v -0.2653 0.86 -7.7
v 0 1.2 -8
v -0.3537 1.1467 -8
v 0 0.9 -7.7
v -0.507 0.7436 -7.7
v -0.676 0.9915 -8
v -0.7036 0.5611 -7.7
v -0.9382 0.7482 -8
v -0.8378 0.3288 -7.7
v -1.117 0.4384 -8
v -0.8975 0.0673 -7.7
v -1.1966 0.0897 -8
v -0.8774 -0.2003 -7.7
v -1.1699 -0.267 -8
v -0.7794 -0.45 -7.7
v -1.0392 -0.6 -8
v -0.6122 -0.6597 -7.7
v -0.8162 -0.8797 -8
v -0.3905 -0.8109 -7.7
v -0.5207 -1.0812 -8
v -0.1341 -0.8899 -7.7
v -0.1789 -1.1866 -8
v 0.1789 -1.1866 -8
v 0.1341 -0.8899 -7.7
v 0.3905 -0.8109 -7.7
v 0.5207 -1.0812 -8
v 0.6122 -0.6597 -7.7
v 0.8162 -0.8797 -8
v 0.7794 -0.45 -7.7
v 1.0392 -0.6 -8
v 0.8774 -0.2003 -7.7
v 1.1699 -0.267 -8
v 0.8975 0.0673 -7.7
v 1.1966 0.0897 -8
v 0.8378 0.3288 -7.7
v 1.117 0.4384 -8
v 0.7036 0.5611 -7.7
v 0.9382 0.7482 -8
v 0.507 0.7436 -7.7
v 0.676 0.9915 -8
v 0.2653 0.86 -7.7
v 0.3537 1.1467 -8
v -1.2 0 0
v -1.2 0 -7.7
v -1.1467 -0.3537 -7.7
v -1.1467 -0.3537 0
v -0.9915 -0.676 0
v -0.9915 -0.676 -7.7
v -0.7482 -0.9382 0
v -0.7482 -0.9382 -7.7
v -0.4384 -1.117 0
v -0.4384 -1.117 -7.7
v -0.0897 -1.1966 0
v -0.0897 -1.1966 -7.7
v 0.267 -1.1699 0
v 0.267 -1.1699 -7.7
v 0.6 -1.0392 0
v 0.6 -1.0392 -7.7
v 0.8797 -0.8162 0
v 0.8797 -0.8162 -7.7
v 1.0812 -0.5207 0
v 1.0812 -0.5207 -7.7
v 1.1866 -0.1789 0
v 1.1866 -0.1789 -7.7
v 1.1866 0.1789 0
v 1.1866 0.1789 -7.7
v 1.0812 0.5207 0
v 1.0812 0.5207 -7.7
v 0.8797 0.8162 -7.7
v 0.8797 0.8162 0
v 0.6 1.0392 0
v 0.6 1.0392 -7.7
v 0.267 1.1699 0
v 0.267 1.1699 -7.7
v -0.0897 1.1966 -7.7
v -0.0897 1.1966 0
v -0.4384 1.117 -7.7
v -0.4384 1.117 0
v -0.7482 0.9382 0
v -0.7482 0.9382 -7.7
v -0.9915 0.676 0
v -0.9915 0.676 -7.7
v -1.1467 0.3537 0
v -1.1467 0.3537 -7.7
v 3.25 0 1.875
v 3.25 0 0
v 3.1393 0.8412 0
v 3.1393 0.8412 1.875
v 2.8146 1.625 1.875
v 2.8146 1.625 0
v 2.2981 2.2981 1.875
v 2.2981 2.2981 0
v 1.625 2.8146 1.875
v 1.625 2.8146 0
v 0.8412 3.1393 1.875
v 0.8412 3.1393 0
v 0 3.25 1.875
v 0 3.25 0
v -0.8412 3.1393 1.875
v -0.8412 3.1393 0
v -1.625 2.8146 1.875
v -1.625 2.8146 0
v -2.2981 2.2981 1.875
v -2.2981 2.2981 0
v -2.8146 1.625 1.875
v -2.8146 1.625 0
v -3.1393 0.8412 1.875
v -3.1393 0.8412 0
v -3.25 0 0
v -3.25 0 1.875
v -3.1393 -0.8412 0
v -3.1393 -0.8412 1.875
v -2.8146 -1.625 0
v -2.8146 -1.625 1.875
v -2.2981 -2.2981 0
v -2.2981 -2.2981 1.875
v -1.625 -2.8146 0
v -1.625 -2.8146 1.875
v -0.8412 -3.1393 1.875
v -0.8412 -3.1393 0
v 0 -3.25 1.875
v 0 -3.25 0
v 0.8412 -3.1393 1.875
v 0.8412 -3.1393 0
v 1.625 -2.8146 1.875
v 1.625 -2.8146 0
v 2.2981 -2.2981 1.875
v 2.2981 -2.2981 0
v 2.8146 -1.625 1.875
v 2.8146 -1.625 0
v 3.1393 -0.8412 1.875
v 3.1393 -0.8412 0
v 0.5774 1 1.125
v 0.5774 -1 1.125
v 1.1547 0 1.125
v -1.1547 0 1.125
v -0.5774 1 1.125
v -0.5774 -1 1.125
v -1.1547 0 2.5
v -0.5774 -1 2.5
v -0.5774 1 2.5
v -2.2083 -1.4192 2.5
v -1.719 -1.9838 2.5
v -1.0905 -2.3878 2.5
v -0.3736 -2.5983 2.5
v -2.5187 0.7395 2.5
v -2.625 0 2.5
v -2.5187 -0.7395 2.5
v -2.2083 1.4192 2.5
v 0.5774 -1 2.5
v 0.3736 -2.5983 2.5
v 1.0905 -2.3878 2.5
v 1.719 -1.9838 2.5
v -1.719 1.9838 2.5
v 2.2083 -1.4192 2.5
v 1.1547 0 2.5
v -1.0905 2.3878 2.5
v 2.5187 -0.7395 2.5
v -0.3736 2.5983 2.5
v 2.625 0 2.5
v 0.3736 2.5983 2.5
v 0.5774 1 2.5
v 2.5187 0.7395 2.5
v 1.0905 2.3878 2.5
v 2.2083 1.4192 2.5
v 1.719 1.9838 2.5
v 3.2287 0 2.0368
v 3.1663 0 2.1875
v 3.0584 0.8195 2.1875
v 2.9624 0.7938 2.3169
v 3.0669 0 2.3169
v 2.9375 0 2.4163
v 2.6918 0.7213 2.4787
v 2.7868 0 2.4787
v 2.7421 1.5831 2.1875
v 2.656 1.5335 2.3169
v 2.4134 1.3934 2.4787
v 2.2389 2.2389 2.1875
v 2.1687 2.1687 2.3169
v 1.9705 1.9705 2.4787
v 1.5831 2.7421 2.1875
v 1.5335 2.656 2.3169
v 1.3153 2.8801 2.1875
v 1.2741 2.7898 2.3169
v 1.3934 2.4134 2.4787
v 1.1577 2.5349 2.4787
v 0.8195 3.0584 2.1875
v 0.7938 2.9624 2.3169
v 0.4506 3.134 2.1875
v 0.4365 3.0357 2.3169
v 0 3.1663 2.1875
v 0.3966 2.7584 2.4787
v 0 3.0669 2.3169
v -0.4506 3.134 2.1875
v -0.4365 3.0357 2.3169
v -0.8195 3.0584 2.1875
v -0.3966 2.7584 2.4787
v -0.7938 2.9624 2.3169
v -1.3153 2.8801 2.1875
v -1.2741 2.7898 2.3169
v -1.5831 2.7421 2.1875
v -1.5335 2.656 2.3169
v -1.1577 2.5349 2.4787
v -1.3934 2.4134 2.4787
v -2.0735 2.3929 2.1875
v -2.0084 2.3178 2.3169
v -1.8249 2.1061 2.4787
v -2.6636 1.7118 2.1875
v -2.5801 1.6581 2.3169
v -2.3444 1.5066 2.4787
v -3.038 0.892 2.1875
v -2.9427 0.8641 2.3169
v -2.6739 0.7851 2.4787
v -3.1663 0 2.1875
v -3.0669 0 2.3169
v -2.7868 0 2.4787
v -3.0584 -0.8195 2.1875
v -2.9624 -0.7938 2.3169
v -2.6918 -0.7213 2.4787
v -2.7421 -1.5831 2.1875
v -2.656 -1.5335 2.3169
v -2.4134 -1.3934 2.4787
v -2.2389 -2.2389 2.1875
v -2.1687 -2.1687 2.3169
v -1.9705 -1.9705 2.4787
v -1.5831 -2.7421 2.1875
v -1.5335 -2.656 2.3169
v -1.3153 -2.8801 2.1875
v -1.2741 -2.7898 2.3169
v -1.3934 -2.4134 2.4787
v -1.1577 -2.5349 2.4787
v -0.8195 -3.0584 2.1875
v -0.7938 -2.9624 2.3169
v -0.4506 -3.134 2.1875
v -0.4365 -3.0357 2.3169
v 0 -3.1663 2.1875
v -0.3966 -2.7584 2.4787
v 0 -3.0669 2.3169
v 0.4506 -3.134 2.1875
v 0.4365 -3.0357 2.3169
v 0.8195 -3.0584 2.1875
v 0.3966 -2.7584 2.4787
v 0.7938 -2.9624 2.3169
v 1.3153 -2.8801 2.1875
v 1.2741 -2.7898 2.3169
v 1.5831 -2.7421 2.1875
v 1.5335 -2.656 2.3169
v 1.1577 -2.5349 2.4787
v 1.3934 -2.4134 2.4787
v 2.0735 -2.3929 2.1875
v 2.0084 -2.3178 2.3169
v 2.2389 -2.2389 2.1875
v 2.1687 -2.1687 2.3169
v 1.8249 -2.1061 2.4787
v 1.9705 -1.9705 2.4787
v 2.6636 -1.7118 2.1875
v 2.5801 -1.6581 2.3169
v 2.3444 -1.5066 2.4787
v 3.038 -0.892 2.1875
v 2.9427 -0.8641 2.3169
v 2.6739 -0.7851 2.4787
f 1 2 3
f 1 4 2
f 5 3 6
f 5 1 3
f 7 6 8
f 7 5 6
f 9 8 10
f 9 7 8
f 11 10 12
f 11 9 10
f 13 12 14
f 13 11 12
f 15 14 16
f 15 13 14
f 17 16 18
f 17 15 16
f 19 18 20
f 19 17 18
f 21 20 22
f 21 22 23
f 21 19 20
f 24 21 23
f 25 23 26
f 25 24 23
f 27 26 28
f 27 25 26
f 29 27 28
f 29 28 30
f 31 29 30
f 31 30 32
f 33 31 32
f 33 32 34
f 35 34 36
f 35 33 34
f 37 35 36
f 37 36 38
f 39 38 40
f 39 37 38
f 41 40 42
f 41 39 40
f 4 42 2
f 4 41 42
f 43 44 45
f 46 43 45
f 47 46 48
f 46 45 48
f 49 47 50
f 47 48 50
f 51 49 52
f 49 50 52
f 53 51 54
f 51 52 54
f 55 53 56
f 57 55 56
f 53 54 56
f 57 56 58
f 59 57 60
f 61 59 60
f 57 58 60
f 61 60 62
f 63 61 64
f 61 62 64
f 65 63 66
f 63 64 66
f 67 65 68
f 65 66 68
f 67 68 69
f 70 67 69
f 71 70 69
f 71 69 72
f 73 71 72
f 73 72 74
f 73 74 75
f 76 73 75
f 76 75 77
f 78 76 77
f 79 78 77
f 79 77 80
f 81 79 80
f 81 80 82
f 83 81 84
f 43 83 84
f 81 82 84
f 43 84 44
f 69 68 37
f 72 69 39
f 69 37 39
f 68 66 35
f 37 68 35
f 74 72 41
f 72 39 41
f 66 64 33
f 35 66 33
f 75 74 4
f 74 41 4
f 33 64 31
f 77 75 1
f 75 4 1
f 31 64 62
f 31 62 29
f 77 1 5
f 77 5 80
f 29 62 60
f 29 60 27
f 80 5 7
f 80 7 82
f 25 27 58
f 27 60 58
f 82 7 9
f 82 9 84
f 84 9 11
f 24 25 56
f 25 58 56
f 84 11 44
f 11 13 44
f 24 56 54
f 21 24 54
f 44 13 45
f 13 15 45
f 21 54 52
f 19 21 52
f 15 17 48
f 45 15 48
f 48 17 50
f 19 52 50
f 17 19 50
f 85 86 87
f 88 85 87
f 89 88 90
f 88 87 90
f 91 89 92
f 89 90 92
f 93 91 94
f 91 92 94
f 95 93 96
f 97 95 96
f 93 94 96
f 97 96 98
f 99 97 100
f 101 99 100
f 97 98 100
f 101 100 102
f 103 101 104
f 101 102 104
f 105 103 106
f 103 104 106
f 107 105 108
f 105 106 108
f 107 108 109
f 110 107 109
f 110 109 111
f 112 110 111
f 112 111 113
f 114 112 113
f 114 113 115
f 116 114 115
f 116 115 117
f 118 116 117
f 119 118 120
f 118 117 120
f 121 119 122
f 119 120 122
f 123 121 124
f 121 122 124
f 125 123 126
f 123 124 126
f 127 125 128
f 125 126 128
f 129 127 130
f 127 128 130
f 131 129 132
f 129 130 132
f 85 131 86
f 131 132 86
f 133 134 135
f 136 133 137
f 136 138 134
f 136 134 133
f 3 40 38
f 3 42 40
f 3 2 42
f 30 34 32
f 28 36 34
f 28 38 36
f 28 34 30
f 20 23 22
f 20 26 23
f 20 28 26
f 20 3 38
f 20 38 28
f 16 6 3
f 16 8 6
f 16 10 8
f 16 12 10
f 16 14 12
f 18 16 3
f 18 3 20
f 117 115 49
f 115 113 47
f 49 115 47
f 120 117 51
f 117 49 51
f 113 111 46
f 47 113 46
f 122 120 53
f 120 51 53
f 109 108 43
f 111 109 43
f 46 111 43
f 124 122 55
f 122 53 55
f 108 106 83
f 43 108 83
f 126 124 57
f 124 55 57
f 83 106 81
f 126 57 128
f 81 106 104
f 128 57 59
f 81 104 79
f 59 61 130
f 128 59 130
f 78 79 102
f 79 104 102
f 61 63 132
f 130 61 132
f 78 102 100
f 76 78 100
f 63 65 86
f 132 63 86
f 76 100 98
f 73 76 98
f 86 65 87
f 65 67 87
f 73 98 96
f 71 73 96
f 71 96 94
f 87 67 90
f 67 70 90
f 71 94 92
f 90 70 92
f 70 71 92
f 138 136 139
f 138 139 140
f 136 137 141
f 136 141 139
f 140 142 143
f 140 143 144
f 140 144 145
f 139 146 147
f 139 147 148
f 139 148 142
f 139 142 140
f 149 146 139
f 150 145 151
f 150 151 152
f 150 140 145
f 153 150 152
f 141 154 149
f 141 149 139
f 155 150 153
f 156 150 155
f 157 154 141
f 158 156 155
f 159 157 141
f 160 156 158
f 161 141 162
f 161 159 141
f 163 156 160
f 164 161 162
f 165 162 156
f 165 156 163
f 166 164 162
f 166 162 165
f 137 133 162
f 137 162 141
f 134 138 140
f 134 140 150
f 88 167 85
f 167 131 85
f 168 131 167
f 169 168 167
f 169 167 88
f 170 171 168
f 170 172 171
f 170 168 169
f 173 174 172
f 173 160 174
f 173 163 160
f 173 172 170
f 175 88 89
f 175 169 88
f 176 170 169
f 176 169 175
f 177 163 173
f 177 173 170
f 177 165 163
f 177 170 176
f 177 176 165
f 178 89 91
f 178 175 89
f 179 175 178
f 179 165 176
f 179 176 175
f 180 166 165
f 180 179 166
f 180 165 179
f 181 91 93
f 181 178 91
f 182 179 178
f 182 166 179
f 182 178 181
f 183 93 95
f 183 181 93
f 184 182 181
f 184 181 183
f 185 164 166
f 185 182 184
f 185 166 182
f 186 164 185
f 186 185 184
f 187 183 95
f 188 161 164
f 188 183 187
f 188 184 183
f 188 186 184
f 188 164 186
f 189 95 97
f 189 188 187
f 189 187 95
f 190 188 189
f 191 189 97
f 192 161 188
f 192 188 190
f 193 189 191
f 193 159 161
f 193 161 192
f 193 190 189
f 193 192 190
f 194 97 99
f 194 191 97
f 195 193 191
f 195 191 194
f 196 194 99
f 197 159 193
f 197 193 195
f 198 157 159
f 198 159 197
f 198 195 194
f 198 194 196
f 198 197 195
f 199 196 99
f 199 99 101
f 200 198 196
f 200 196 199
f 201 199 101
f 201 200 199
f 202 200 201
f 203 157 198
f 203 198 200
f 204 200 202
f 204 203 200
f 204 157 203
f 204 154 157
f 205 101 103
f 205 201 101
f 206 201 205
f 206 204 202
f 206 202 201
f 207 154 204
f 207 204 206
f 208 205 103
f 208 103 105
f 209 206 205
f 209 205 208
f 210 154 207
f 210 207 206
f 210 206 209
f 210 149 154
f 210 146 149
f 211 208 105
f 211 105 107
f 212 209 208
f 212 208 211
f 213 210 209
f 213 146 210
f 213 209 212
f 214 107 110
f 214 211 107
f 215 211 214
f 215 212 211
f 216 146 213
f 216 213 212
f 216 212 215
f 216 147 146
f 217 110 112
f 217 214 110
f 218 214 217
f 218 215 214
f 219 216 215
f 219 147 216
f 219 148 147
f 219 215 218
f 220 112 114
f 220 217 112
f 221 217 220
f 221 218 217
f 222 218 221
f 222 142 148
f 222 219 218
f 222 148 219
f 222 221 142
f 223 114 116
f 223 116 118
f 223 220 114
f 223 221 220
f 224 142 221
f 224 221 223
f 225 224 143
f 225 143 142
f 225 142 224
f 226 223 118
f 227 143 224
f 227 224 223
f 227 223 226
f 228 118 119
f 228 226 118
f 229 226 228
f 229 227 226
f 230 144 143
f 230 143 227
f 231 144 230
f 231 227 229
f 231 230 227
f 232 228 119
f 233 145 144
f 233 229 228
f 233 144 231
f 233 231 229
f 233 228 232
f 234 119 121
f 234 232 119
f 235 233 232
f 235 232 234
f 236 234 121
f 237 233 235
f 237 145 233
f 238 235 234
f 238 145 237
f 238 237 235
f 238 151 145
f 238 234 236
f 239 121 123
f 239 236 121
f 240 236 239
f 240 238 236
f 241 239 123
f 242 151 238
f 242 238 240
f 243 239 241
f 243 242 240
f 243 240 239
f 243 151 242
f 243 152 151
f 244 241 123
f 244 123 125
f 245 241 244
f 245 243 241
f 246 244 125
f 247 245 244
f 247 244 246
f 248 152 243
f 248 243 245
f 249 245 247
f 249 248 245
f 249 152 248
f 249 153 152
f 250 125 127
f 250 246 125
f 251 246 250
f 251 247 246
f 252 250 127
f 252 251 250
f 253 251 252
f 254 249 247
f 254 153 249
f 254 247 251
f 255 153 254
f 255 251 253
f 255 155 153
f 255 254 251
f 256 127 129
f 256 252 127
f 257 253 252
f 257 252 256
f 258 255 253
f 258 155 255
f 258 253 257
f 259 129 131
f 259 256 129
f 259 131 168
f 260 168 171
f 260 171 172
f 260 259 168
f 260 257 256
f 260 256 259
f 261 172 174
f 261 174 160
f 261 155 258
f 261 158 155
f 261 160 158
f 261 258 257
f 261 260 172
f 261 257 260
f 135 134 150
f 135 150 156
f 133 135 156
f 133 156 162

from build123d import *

# Parameters (mm, degrees)
F_0000_CYLINDER_SKETCH_R    = 3.25
F_0000_CYLINDER_DEPTH       = 2.5
F_0001_FILLET_R             = 0.625
F_0002_EXTRUDE_DEPTH        = 1.385
F_0002_EXTRUDE_ROTATE_ANGLE = 120
F_0005_CYLINDER_SKETCH_R    = 1.2
F_0005_CYLINDER_DEPTH       = 7.7
F_0006_CONE_ROTATE_ANGLE    = 90


with BuildPart() as part:
    # 0000_cylinder_Sketch → 0000_cylinder (new body)
    with BuildSketch(Plane.XY):
        Circle(F_0000_CYLINDER_SKETCH_R)
    extrude(amount=F_0000_CYLINDER_DEPTH)

    # 0001_fillet
    f_0001_fillet_edges = [part.edges().sort_by_distance(p)[0] for p in [
        (-3.25, 0, 2.5),
    ]]
    fillet(f_0001_fillet_edges, radius=F_0001_FILLET_R)


with BuildPart() as body_2:
    # 0002_extrude_Sketch → 0002_extrude (new body)
    with BuildSketch(Plane.XY):
        Polygon((0, 0), (1.154700538, 0), (1.732050808, 1), (1.154700538, 2), (0, 2), (-0.577350269, 1), align=None)
    extrude(amount=F_0002_EXTRUDE_DEPTH)


with BuildPart() as body_2_1:
    # 0002_extrude_Rotate: read off the stored shape, not the designer's step
    # 0002_extrude_Rotate: moved
    add(body_2.part.rotate(Axis((0, 0, 0), (0, 0, 1)), F_0002_EXTRUDE_ROTATE_ANGLE))


with BuildPart() as body_2_2:
    # 0002_extrude_Translate: moved
    add(body_2_1.part.moved(Location((1.154700538, 0, 1.125))))


with BuildPart() as part_1:
    add(part.part)

    # 0004_sub: cut body 2
    add(body_2_2.part, mode=Mode.SUBTRACT)


with BuildPart() as body_2_2_1:
    # 0005_cylinder_Sketch → 0005_cylinder (new body)
    with BuildSketch(Plane.XY):
        with Locations(Location((0, 0, 0), (0, 0, 180))):
            Circle(F_0005_CYLINDER_SKETCH_R)
    extrude(amount=F_0005_CYLINDER_DEPTH)


with BuildPart() as body_2_2_2:
    # 0005_cylinder_Translate: moved
    add(body_2_2_1.part.moved(Location((0, 0, -7.7))))


with BuildPart() as body_3:
    # 0006_cone_Sketch → 0006_cone (revolve)
    with BuildSketch(Plane.XY, mode=Mode.PRIVATE) as f_0006_cone_sk:
        Polygon((0, 0), (1.2, 0), (0.9, 0.3), (0, 0.3), align=None)
    revolve(f_0006_cone_sk.sketch.rotate(Axis((0, -100, 0), (0, 1, 0)), 90), axis=Axis((0, -100, 0), (0, 1, 0)))


with BuildPart() as body_3_1:
    # 0006_cone_Rotate: moved
    add(body_3.part.rotate(Axis((0, 0, 0), (1, 0, 0)), F_0006_CONE_ROTATE_ANGLE))


with BuildPart() as body_3_2:
    # 0006_cone_Translate: moved
    add(body_3_1.part.moved(Location((0, 0, -8))))


with BuildPart() as body_2_2_3:
    add(body_2_2_2.part)

    # 0008_add: union body 3
    add(body_3_2.part)


with BuildPart() as part_2:
    add(part_1.part)

    # 0009_add: union body 2 2
    add(body_2_2_3.part)


solid = part_2.part
